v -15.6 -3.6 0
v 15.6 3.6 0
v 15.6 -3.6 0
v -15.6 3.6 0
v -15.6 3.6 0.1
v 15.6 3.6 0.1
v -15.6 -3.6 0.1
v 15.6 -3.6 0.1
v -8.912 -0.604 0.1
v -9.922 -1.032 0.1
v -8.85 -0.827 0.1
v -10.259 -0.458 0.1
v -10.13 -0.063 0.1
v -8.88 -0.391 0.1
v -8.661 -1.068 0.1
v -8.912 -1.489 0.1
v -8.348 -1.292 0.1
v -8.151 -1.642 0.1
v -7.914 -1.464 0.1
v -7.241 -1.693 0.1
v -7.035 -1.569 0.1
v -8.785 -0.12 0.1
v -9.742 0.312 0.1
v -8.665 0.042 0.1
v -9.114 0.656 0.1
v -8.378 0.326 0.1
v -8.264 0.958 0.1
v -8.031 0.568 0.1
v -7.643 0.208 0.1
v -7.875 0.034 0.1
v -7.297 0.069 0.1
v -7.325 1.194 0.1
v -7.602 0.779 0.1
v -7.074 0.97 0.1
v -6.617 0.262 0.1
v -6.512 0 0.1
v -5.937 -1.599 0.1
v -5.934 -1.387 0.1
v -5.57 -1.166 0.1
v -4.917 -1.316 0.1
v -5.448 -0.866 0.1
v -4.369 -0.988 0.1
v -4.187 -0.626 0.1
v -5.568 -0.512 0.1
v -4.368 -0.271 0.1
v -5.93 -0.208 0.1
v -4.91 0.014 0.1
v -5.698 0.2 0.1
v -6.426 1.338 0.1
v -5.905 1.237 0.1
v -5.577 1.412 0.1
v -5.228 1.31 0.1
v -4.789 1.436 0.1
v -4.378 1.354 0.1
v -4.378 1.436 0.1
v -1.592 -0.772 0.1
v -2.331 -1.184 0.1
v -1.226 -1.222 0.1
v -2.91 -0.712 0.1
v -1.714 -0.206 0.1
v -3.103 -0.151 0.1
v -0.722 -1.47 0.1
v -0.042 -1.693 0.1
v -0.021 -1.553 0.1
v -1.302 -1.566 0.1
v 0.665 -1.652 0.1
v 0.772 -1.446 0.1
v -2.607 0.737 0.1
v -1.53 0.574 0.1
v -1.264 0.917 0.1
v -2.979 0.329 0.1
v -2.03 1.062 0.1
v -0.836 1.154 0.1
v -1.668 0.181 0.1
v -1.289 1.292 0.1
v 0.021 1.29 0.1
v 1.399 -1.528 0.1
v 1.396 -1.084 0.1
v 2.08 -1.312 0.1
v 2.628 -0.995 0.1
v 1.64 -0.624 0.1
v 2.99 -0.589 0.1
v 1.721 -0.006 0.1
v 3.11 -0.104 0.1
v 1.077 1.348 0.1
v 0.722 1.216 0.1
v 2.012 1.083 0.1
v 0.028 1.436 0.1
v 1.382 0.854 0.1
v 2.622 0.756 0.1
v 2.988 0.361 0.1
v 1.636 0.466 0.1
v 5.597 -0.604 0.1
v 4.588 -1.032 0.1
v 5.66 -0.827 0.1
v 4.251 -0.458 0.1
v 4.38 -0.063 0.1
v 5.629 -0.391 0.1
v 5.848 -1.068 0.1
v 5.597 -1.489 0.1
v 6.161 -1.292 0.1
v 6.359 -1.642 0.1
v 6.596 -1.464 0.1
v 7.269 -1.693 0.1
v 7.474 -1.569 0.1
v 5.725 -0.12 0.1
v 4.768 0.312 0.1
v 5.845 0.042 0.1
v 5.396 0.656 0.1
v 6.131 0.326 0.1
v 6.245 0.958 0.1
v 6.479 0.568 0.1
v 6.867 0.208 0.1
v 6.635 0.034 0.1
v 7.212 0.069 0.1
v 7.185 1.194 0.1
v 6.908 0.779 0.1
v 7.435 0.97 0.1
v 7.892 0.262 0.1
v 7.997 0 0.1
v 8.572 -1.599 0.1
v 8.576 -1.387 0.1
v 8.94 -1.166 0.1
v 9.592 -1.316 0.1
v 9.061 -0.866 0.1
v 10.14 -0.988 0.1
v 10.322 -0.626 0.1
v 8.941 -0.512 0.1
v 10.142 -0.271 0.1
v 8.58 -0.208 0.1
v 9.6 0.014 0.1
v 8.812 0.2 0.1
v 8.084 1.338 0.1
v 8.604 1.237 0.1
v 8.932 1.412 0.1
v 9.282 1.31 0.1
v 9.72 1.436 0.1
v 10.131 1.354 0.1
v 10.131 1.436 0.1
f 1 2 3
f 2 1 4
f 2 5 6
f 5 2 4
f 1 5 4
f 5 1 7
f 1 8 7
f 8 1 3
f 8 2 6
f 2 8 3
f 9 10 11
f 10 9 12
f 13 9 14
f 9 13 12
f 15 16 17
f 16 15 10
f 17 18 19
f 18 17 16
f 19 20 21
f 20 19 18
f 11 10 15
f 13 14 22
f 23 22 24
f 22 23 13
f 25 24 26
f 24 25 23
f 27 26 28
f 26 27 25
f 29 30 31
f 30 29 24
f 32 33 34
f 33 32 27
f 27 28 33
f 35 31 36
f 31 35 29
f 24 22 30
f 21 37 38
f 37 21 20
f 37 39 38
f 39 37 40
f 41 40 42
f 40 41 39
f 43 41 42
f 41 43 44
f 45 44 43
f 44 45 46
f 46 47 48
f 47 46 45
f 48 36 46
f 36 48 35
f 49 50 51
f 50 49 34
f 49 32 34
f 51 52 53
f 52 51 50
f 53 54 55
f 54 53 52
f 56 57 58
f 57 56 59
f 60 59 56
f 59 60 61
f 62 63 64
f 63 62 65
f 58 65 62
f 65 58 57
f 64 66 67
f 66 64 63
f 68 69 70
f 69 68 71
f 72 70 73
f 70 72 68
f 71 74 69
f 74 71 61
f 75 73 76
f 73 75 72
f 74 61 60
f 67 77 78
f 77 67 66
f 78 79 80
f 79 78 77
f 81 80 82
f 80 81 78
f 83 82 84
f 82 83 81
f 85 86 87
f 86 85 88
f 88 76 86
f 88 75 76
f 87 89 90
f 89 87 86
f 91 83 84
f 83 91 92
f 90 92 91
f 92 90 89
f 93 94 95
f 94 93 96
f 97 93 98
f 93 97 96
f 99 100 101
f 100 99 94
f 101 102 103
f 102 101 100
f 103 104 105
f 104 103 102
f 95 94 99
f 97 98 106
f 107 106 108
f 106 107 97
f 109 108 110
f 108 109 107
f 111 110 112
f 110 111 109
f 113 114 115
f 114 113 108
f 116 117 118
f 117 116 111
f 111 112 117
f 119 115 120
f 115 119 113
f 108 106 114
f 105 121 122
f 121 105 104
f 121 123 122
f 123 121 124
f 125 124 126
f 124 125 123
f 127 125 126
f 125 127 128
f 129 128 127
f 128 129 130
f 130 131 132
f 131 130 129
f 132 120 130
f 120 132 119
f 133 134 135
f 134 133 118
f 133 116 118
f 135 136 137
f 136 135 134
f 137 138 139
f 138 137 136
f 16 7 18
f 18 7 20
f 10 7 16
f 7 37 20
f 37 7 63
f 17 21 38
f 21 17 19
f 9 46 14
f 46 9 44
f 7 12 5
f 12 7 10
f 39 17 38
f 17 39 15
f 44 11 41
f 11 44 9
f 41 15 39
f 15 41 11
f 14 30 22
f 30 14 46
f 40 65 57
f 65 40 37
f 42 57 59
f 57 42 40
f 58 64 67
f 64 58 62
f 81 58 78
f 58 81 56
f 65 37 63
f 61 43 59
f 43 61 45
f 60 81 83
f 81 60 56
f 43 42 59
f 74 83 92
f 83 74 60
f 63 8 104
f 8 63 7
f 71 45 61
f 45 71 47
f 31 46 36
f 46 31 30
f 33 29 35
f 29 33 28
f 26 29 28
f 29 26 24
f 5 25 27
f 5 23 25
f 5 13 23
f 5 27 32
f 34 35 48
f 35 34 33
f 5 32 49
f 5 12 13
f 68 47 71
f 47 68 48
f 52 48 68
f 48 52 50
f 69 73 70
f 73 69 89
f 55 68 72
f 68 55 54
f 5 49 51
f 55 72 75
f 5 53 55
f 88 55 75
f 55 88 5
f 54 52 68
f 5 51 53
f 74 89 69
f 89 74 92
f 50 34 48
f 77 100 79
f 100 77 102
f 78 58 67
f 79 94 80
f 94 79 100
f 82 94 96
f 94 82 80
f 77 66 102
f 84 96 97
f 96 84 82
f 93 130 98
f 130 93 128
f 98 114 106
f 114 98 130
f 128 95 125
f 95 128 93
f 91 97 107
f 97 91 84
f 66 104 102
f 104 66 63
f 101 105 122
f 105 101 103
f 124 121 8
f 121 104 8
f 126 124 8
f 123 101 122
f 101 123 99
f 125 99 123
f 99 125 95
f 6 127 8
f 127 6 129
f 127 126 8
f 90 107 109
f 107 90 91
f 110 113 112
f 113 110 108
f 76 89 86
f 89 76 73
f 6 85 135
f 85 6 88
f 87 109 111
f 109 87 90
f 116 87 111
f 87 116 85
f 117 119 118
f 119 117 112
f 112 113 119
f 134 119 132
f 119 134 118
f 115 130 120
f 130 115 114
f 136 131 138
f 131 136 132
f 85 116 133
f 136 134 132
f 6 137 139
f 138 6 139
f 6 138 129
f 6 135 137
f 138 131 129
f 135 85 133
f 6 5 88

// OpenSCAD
// file: ../p/box5-12.scad
use <../lib.scad>
function ldraw_lib__box5_12() = [
// 0 Box with 5 Faces without Any Edges
// 0 Name: box5-12.dat
// 0 Author: Chris Dee [cwdee]
// 0 !LDRAW_ORG Primitive UPDATE 2009-02
// 0 !LICENSE Licensed under CC BY 2.0 and CC BY 4.0 : see CAreadme.txt
// 
// 0 BFC CERTIFY CCW
  [0,"BFC","CERTIFY"],
  [0,"BFC","CCW"],
// 
// 0 !HISTORY 2009-09-03 [PTadmin] Official Update 2009-02
// 
// 
// 4 16 1 1 1 1 1 -1 -1 1 -1 -1 1 1
  [4,16,1,1,1,1,1,-1,-1,1,-1,-1,1,1],
// 4 16 -1 0 1 1 0 1 1 1 1 -1 1 1
  [4,16,-1,0,1,1,0,1,1,1,1,-1,1,1],
// 4 16 -1 0 -1 -1 0 1 -1 1 1 -1 1 -1
  [4,16,-1,0,-1,-1,0,1,-1,1,1,-1,1,-1],
// 4 16 1 0 -1 -1 0 -1 -1 1 -1 1 1 -1
  [4,16,1,0,-1,-1,0,-1,-1,1,-1,1,1,-1],
// 4 16 1 0 1 1 0 -1 1 1 -1 1 1 1
  [4,16,1,0,1,1,0,-1,1,1,-1,1,1,1],
// 0
];
makepoly(ldraw_lib__box5_12(), line=0.2);
// main file
use <../lib.scad>
use <../p/box5-12.scad>
function ldraw_lib__4188571f() = [
// 0 Sticker  0.9 x  3.9 with Black "606"
// 0 Name: 4188571f.dat
// 0 Author: Gerald Lasser [GeraldLasser]
// 0 !LDRAW_ORG Part UPDATE 2015-01
// 0 !LICENSE Licensed under CC BY 2.0 and CC BY 4.0 : see CAreadme.txt
// 
// 0 BFC CERTIFY CCW
  [0,"BFC","CERTIFY"],
  [0,"BFC","CCW"],
// 
// 0 !KEYWORDS santa fe, Train
// 
// 0 !HISTORY 2015-10-11 [PTadmin] Official Update 2015-01
// 
// 
// 0 // Original Text Produced by txt2dat, Copyright 2005-2007, 2009 R. Crawford
// 0 // Using font: "Times New Roman" style: "Regular" size: 40pt
// 0 // LDRAW Scaling of Txt2dat output: 1.02 0 0 0 1 0 0 0 0.32
// 
// 1 80 0 -0.25 0 39 0 0 0 0.25 0 0 0 9 box5-12.dat
  [1,80,0,-0.25,0,39,0,0,0,0.25,0,0,0,9, ldraw_lib__box5_12()],
// 
// 4 0 -24.805 -0.25 -2.58 -22.124 -0.25 -2.067 -22.281 -0.25 -1.511 -25.647 -0.25 -1.144
  [4,0,-24.805,-0.25,-2.58,-22.124,-0.25,-2.067,-22.281,-0.25,-1.511,-25.647,-0.25,-1.144],
// 4 0 -25.647 -0.25 -1.144 -22.281 -0.25 -1.511 -22.201 -0.25 -0.977 -25.324 -0.25 -0.158
  [4,0,-25.647,-0.25,-1.144,-22.281,-0.25,-1.511,-22.201,-0.25,-0.977,-25.324,-0.25,-0.158],
// 4 0 -21.653 -0.25 -2.669 -24.805 -0.25 -2.58 -22.281 -0.25 -3.722 -20.871 -0.25 -3.23
  [4,0,-21.653,-0.25,-2.669,-24.805,-0.25,-2.58,-22.281,-0.25,-3.722,-20.871,-0.25,-3.23],
// 4 0 -19.784 -0.25 -3.661 -20.871 -0.25 -3.23 -22.281 -0.25 -3.722 -20.378 -0.25 -4.105
  [4,0,-19.784,-0.25,-3.661,-20.871,-0.25,-3.23,-22.281,-0.25,-3.722,-20.378,-0.25,-4.105],
// 4 0 -19.784 -0.25 -3.661 -20.378 -0.25 -4.105 -18.102 -0.25 -4.233 -17.588 -0.25 -3.922
  [4,0,-19.784,-0.25,-3.661,-20.378,-0.25,-4.105,-18.102,-0.25,-4.233,-17.588,-0.25,-3.922],
// 3 0 -22.124 -0.25 -2.067 -24.805 -0.25 -2.58 -21.653 -0.25 -2.669
  [3,0,-22.124,-0.25,-2.067,-24.805,-0.25,-2.58,-21.653,-0.25,-2.669],
// 3 0 -25.324 -0.25 -0.158 -22.201 -0.25 -0.977 -21.963 -0.25 -0.299
  [3,0,-25.324,-0.25,-0.158,-22.201,-0.25,-0.977,-21.963,-0.25,-0.299],
// 4 0 -21.662 -0.25 0.106 -24.354 -0.25 0.779 -25.324 -0.25 -0.158 -21.963 -0.25 -0.299
  [4,0,-21.662,-0.25,0.106,-24.354,-0.25,0.779,-25.324,-0.25,-0.158,-21.963,-0.25,-0.299],
// 4 0 -24.354 -0.25 0.779 -21.662 -0.25 0.106 -20.946 -0.25 0.816 -22.784 -0.25 1.639
  [4,0,-24.354,-0.25,0.779,-21.662,-0.25,0.106,-20.946,-0.25,0.816,-22.784,-0.25,1.639],
// 4 0 -20.077 -0.25 1.421 -20.661 -0.25 2.396 -22.784 -0.25 1.639 -20.946 -0.25 0.816
  [4,0,-20.077,-0.25,1.421,-20.661,-0.25,2.396,-22.784,-0.25,1.639,-20.946,-0.25,0.816],
// 4 0 -19.107 -0.25 0.519 -21.662 -0.25 0.106 -19.687 -0.25 0.084 -18.243 -0.25 0.173
  [4,0,-19.107,-0.25,0.519,-21.662,-0.25,0.106,-19.687,-0.25,0.084,-18.243,-0.25,0.173],
// 4 0 -17.686 -0.25 2.424 -18.312 -0.25 2.986 -20.661 -0.25 2.396 -19.005 -0.25 1.948
  [4,0,-17.686,-0.25,2.424,-18.312,-0.25,2.986,-20.661,-0.25,2.396,-19.005,-0.25,1.948],
// 3 0 -20.661 -0.25 2.396 -20.077 -0.25 1.421 -19.005 -0.25 1.948
  [3,0,-20.661,-0.25,2.396,-20.077,-0.25,1.421,-19.005,-0.25,1.948],
// 4 0 -16.543 -0.25 0.656 -19.107 -0.25 0.519 -18.243 -0.25 0.173 -16.281 -0.25 0
  [4,0,-16.543,-0.25,0.656,-19.107,-0.25,0.519,-18.243,-0.25,0.173,-16.281,-0.25,0],
// 3 0 -21.662 -0.25 0.106 -21.963 -0.25 -0.299 -19.687 -0.25 0.084
  [3,0,-21.662,-0.25,0.106,-21.963,-0.25,-0.299,-19.687,-0.25,0.084],
// 4 0 -17.588 -0.25 -3.922 -18.102 -0.25 -4.233 -14.842 -0.25 -3.997 -14.834 -0.25 -3.467
  [4,0,-17.588,-0.25,-3.922,-18.102,-0.25,-4.233,-14.842,-0.25,-3.997,-14.834,-0.25,-3.467],
// 4 0 -12.292 -0.25 -3.289 -13.924 -0.25 -2.914 -14.834 -0.25 -3.467 -14.842 -0.25 -3.997
  [4,0,-12.292,-0.25,-3.289,-13.924,-0.25,-2.914,-14.834,-0.25,-3.467,-14.842,-0.25,-3.997],
// 4 0 -10.923 -0.25 -2.469 -13.62 -0.25 -2.166 -13.924 -0.25 -2.914 -12.292 -0.25 -3.289
  [4,0,-10.923,-0.25,-2.469,-13.62,-0.25,-2.166,-13.924,-0.25,-2.914,-12.292,-0.25,-3.289],
// 4 0 -13.62 -0.25 -2.166 -10.923 -0.25 -2.469 -10.467 -0.25 -1.566 -13.921 -0.25 -1.28
  [4,0,-13.62,-0.25,-2.166,-10.923,-0.25,-2.469,-10.467,-0.25,-1.566,-13.921,-0.25,-1.28],
// 4 0 -13.921 -0.25 -1.28 -10.467 -0.25 -1.566 -10.919 -0.25 -0.677 -14.825 -0.25 -0.521
  [4,0,-13.921,-0.25,-1.28,-10.467,-0.25,-1.566,-10.919,-0.25,-0.677,-14.825,-0.25,-0.521],
// 4 0 -14.825 -0.25 -0.521 -10.919 -0.25 -0.677 -12.275 -0.25 0.034 -14.245 -0.25 0.501
  [4,0,-14.825,-0.25,-0.521,-10.919,-0.25,-0.677,-12.275,-0.25,0.034,-14.245,-0.25,0.501],
// 4 0 -14.245 -0.25 0.501 -16.543 -0.25 0.656 -16.281 -0.25 0 -14.825 -0.25 -0.521
  [4,0,-14.245,-0.25,0.501,-16.543,-0.25,0.656,-16.281,-0.25,0,-14.825,-0.25,-0.521],
// 4 0 -16.065 -0.25 3.346 -17.686 -0.25 2.424 -14.762 -0.25 3.093 -13.943 -0.25 3.529
  [4,0,-16.065,-0.25,3.346,-17.686,-0.25,2.424,-14.762,-0.25,3.093,-13.943,-0.25,3.529],
// 3 0 -16.065 -0.25 3.346 -18.312 -0.25 2.986 -17.686 -0.25 2.424
  [3,0,-16.065,-0.25,3.346,-18.312,-0.25,2.986,-17.686,-0.25,2.424],
// 4 0 -13.943 -0.25 3.529 -14.762 -0.25 3.093 -13.069 -0.25 3.276 -11.973 -0.25 3.59
  [4,0,-13.943,-0.25,3.529,-14.762,-0.25,3.093,-13.069,-0.25,3.276,-11.973,-0.25,3.59],
// 4 0 -11.973 -0.25 3.59 -13.069 -0.25 3.276 -10.946 -0.25 3.385 -10.946 -0.25 3.59
  [4,0,-11.973,-0.25,3.59,-13.069,-0.25,3.276,-10.946,-0.25,3.385,-10.946,-0.25,3.59],
// 4 0 -3.981 -0.25 -1.929 -7.275 -0.25 -1.779 -5.827 -0.25 -2.961 -3.064 -0.25 -3.055
  [4,0,-3.981,-0.25,-1.929,-7.275,-0.25,-1.779,-5.827,-0.25,-2.961,-3.064,-0.25,-3.055],
// 4 0 -4.286 -0.25 -0.516 -7.758 -0.25 -0.377 -7.275 -0.25 -1.779 -3.981 -0.25 -1.929
  [4,0,-4.286,-0.25,-0.516,-7.758,-0.25,-0.377,-7.275,-0.25,-1.779,-3.981,-0.25,-1.929],
// 4 0 -1.806 -0.25 -3.676 -3.255 -0.25 -3.915 -0.106 -0.25 -4.233 -0.053 -0.25 -3.883
  [4,0,-1.806,-0.25,-3.676,-3.255,-0.25,-3.915,-0.106,-0.25,-4.233,-0.053,-0.25,-3.883],
// 4 0 -3.255 -0.25 -3.915 -1.806 -0.25 -3.676 -3.064 -0.25 -3.055 -5.827 -0.25 -2.961
  [4,0,-3.255,-0.25,-3.915,-1.806,-0.25,-3.676,-3.064,-0.25,-3.055,-5.827,-0.25,-2.961],
// 4 0 -0.053 -0.25 -3.883 -0.106 -0.25 -4.233 1.663 -0.25 -4.13 1.931 -0.25 -3.614
  [4,0,-0.053,-0.25,-3.883,-0.106,-0.25,-4.233,1.663,-0.25,-4.13,1.931,-0.25,-3.614],
// 4 0 -6.518 -0.25 1.843 -7.448 -0.25 0.823 -3.826 -0.25 1.434 -3.161 -0.25 2.292
  [4,0,-6.518,-0.25,1.843,-7.448,-0.25,0.823,-3.826,-0.25,1.434,-3.161,-0.25,2.292],
// 4 0 -5.074 -0.25 2.655 -6.518 -0.25 1.843 -3.161 -0.25 2.292 -2.09 -0.25 2.885
  [4,0,-5.074,-0.25,2.655,-6.518,-0.25,1.843,-3.161,-0.25,2.292,-2.09,-0.25,2.885],
// 4 0 -7.448 -0.25 0.823 -7.758 -0.25 -0.377 -4.171 -0.25 0.452 -3.826 -0.25 1.434
  [4,0,-7.448,-0.25,0.823,-7.758,-0.25,-0.377,-4.171,-0.25,0.452,-3.826,-0.25,1.434],
// 4 0 -3.223 -0.25 3.229 -5.074 -0.25 2.655 -2.09 -0.25 2.885 0.053 -0.25 3.224
  [4,0,-3.223,-0.25,3.229,-5.074,-0.25,2.655,-2.09,-0.25,2.885,0.053,-0.25,3.224],
// 3 0 -4.171 -0.25 0.452 -7.758 -0.25 -0.377 -4.286 -0.25 -0.516
  [3,0,-4.171,-0.25,0.452,-7.758,-0.25,-0.377,-4.286,-0.25,-0.516],
// 4 0 1.931 -0.25 -3.614 1.663 -0.25 -4.13 3.498 -0.25 -3.819 3.489 -0.25 -2.711
  [4,0,1.931,-0.25,-3.614,1.663,-0.25,-4.13,3.498,-0.25,-3.819,3.489,-0.25,-2.711],
// 4 0 3.489 -0.25 -2.711 3.498 -0.25 -3.819 5.201 -0.25 -3.28 6.571 -0.25 -2.488
  [4,0,3.489,-0.25,-2.711,3.498,-0.25,-3.819,5.201,-0.25,-3.28,6.571,-0.25,-2.488],
// 4 0 4.1 -0.25 -1.559 3.489 -0.25 -2.711 6.571 -0.25 -2.488 7.475 -0.25 -1.473
  [4,0,4.1,-0.25,-1.559,3.489,-0.25,-2.711,6.571,-0.25,-2.488,7.475,-0.25,-1.473],
// 4 0 4.1 -0.25 -1.559 7.475 -0.25 -1.473 7.775 -0.25 -0.26 4.303 -0.25 -0.016
  [4,0,4.1,-0.25,-1.559,7.475,-0.25,-1.473,7.775,-0.25,-0.26,4.303,-0.25,-0.016],
// 4 0 1.806 -0.25 3.04 5.031 -0.25 2.707 2.692 -0.25 3.369 0.071 -0.25 3.59
  [4,0,1.806,-0.25,3.04,5.031,-0.25,2.707,2.692,-0.25,3.369,0.071,-0.25,3.59],
// 3 0 0.071 -0.25 3.59 0.053 -0.25 3.224 1.806 -0.25 3.04
  [3,0,0.071,-0.25,3.59,0.053,-0.25,3.224,1.806,-0.25,3.04],
// 3 0 0.071 -0.25 3.59 -3.223 -0.25 3.229 0.053 -0.25 3.224
  [3,0,0.071,-0.25,3.59,-3.223,-0.25,3.229,0.053,-0.25,3.224],
// 4 0 5.031 -0.25 2.707 1.806 -0.25 3.04 3.454 -0.25 2.135 6.556 -0.25 1.891
  [4,0,5.031,-0.25,2.707,1.806,-0.25,3.04,3.454,-0.25,2.135,6.556,-0.25,1.891],
// 4 0 7.47 -0.25 0.902 4.091 -0.25 1.166 4.303 -0.25 -0.016 7.775 -0.25 -0.26
  [4,0,7.47,-0.25,0.902,4.091,-0.25,1.166,4.303,-0.25,-0.016,7.775,-0.25,-0.26],
// 4 0 4.091 -0.25 1.166 7.47 -0.25 0.902 6.556 -0.25 1.891 3.454 -0.25 2.135
  [4,0,4.091,-0.25,1.166,7.47,-0.25,0.902,6.556,-0.25,1.891,3.454,-0.25,2.135],
// 4 0 11.469 -0.25 -2.58 14.149 -0.25 -2.067 13.992 -0.25 -1.511 10.627 -0.25 -1.144
  [4,0,11.469,-0.25,-2.58,14.149,-0.25,-2.067,13.992,-0.25,-1.511,10.627,-0.25,-1.144],
// 4 0 10.627 -0.25 -1.144 13.992 -0.25 -1.511 14.072 -0.25 -0.977 10.951 -0.25 -0.158
  [4,0,10.627,-0.25,-1.144,13.992,-0.25,-1.511,14.072,-0.25,-0.977,10.951,-0.25,-0.158],
// 4 0 14.621 -0.25 -2.669 11.469 -0.25 -2.58 13.992 -0.25 -3.722 15.403 -0.25 -3.23
  [4,0,14.621,-0.25,-2.669,11.469,-0.25,-2.58,13.992,-0.25,-3.722,15.403,-0.25,-3.23],
// 4 0 16.489 -0.25 -3.661 15.403 -0.25 -3.23 13.992 -0.25 -3.722 15.897 -0.25 -4.105
  [4,0,16.489,-0.25,-3.661,15.403,-0.25,-3.23,13.992,-0.25,-3.722,15.897,-0.25,-4.105],
// 4 0 16.489 -0.25 -3.661 15.897 -0.25 -4.105 18.172 -0.25 -4.233 18.686 -0.25 -3.922
  [4,0,16.489,-0.25,-3.661,15.897,-0.25,-4.105,18.172,-0.25,-4.233,18.686,-0.25,-3.922],
// 3 0 14.149 -0.25 -2.067 11.469 -0.25 -2.58 14.621 -0.25 -2.669
  [3,0,14.149,-0.25,-2.067,11.469,-0.25,-2.58,14.621,-0.25,-2.669],
// 3 0 10.951 -0.25 -0.158 14.072 -0.25 -0.977 14.312 -0.25 -0.299
  [3,0,10.951,-0.25,-0.158,14.072,-0.25,-0.977,14.312,-0.25,-0.299],
// 4 0 14.613 -0.25 0.106 11.92 -0.25 0.779 10.951 -0.25 -0.158 14.312 -0.25 -0.299
  [4,0,14.613,-0.25,0.106,11.92,-0.25,0.779,10.951,-0.25,-0.158,14.312,-0.25,-0.299],
// 4 0 11.92 -0.25 0.779 14.613 -0.25 0.106 15.328 -0.25 0.816 13.489 -0.25 1.639
  [4,0,11.92,-0.25,0.779,14.613,-0.25,0.106,15.328,-0.25,0.816,13.489,-0.25,1.639],
// 4 0 16.198 -0.25 1.421 15.613 -0.25 2.396 13.489 -0.25 1.639 15.328 -0.25 0.816
  [4,0,16.198,-0.25,1.421,15.613,-0.25,2.396,13.489,-0.25,1.639,15.328,-0.25,0.816],
// 4 0 17.167 -0.25 0.519 14.613 -0.25 0.106 16.587 -0.25 0.084 18.031 -0.25 0.173
  [4,0,17.167,-0.25,0.519,14.613,-0.25,0.106,16.587,-0.25,0.084,18.031,-0.25,0.173],
// 4 0 18.588 -0.25 2.424 17.962 -0.25 2.986 15.613 -0.25 2.396 17.269 -0.25 1.948
  [4,0,18.588,-0.25,2.424,17.962,-0.25,2.986,15.613,-0.25,2.396,17.269,-0.25,1.948],
// 3 0 15.613 -0.25 2.396 16.198 -0.25 1.421 17.269 -0.25 1.948
  [3,0,15.613,-0.25,2.396,16.198,-0.25,1.421,17.269,-0.25,1.948],
// 4 0 19.731 -0.25 0.656 17.167 -0.25 0.519 18.031 -0.25 0.173 19.992 -0.25 0
  [4,0,19.731,-0.25,0.656,17.167,-0.25,0.519,18.031,-0.25,0.173,19.992,-0.25,0],
// 3 0 14.613 -0.25 0.106 14.312 -0.25 -0.299 16.587 -0.25 0.084
  [3,0,14.613,-0.25,0.106,14.312,-0.25,-0.299,16.587,-0.25,0.084],
// 4 0 18.686 -0.25 -3.922 18.172 -0.25 -4.233 21.431 -0.25 -3.997 21.44 -0.25 -3.467
  [4,0,18.686,-0.25,-3.922,18.172,-0.25,-4.233,21.431,-0.25,-3.997,21.44,-0.25,-3.467],
// 4 0 23.981 -0.25 -3.289 22.35 -0.25 -2.914 21.44 -0.25 -3.467 21.431 -0.25 -3.997
  [4,0,23.981,-0.25,-3.289,22.35,-0.25,-2.914,21.44,-0.25,-3.467,21.431,-0.25,-3.997],
// 4 0 25.35 -0.25 -2.469 22.653 -0.25 -2.166 22.35 -0.25 -2.914 23.981 -0.25 -3.289
  [4,0,25.35,-0.25,-2.469,22.653,-0.25,-2.166,22.35,-0.25,-2.914,23.981,-0.25,-3.289],
// 4 0 22.653 -0.25 -2.166 25.35 -0.25 -2.469 25.806 -0.25 -1.566 22.352 -0.25 -1.28
  [4,0,22.653,-0.25,-2.166,25.35,-0.25,-2.469,25.806,-0.25,-1.566,22.352,-0.25,-1.28],
// 4 0 22.352 -0.25 -1.28 25.806 -0.25 -1.566 25.354 -0.25 -0.677 21.449 -0.25 -0.521
  [4,0,22.352,-0.25,-1.28,25.806,-0.25,-1.566,25.354,-0.25,-0.677,21.449,-0.25,-0.521],
// 4 0 21.449 -0.25 -0.521 25.354 -0.25 -0.677 24 -0.25 0.034 22.029 -0.25 0.501
  [4,0,21.449,-0.25,-0.521,25.354,-0.25,-0.677,24,-0.25,0.034,22.029,-0.25,0.501],
// 4 0 22.029 -0.25 0.501 19.731 -0.25 0.656 19.992 -0.25 0 21.449 -0.25 -0.521
  [4,0,22.029,-0.25,0.501,19.731,-0.25,0.656,19.992,-0.25,0,21.449,-0.25,-0.521],
// 4 0 20.209 -0.25 3.346 18.588 -0.25 2.424 21.511 -0.25 3.093 22.33 -0.25 3.529
  [4,0,20.209,-0.25,3.346,18.588,-0.25,2.424,21.511,-0.25,3.093,22.33,-0.25,3.529],
// 3 0 20.209 -0.25 3.346 17.962 -0.25 2.986 18.588 -0.25 2.424
  [3,0,20.209,-0.25,3.346,17.962,-0.25,2.986,18.588,-0.25,2.424],
// 4 0 22.33 -0.25 3.529 21.511 -0.25 3.093 23.205 -0.25 3.276 24.3 -0.25 3.59
  [4,0,22.33,-0.25,3.529,21.511,-0.25,3.093,23.205,-0.25,3.276,24.3,-0.25,3.59],
// 4 0 24.3 -0.25 3.59 23.205 -0.25 3.276 25.328 -0.25 3.385 25.328 -0.25 3.59
  [4,0,24.3,-0.25,3.59,23.205,-0.25,3.276,25.328,-0.25,3.385,25.328,-0.25,3.59],
// 3 80 -22.281 -0.25 -3.722 -39 -0.25 -9 -20.378 -0.25 -4.105
  [3,80,-22.281,-0.25,-3.722,-39,-0.25,-9,-20.378,-0.25,-4.105],
// 3 80 -20.378 -0.25 -4.105 -39 -0.25 -9 -18.102 -0.25 -4.233
  [3,80,-20.378,-0.25,-4.105,-39,-0.25,-9,-18.102,-0.25,-4.233],
// 3 80 -24.805 -0.25 -2.58 -39 -0.25 -9 -22.281 -0.25 -3.722
  [3,80,-24.805,-0.25,-2.58,-39,-0.25,-9,-22.281,-0.25,-3.722],
// 4 80 -0.106 -0.25 -4.233 -14.842 -0.25 -3.997 -18.102 -0.25 -4.233 -39 -0.25 -9
  [4,80,-0.106,-0.25,-4.233,-14.842,-0.25,-3.997,-18.102,-0.25,-4.233,-39,-0.25,-9],
// 4 80 -19.784 -0.25 -3.661 -17.588 -0.25 -3.922 -14.834 -0.25 -3.467 -20.871 -0.25 -3.23
  [4,80,-19.784,-0.25,-3.661,-17.588,-0.25,-3.922,-14.834,-0.25,-3.467,-20.871,-0.25,-3.23],
// 4 80 -14.825 -0.25 -0.521 -22.201 -0.25 -0.977 -22.281 -0.25 -1.511 -13.921 -0.25 -1.28
  [4,80,-14.825,-0.25,-0.521,-22.201,-0.25,-0.977,-22.281,-0.25,-1.511,-13.921,-0.25,-1.28],
// 4 80 -39 -0.25 -9 -24.805 -0.25 -2.58 -25.647 -0.25 -1.144 -39 -0.25 9
  [4,80,-39,-0.25,-9,-24.805,-0.25,-2.58,-25.647,-0.25,-1.144,-39,-0.25,9],
// 4 80 -13.924 -0.25 -2.914 -21.653 -0.25 -2.669 -20.871 -0.25 -3.23 -14.834 -0.25 -3.467
  [4,80,-13.924,-0.25,-2.914,-21.653,-0.25,-2.669,-20.871,-0.25,-3.23,-14.834,-0.25,-3.467],
// 4 80 -13.921 -0.25 -1.28 -22.281 -0.25 -1.511 -22.124 -0.25 -2.067 -13.62 -0.25 -2.166
  [4,80,-13.921,-0.25,-1.28,-22.281,-0.25,-1.511,-22.124,-0.25,-2.067,-13.62,-0.25,-2.166],
// 4 80 -13.62 -0.25 -2.166 -22.124 -0.25 -2.067 -21.653 -0.25 -2.669 -13.924 -0.25 -2.914
  [4,80,-13.62,-0.25,-2.166,-22.124,-0.25,-2.067,-21.653,-0.25,-2.669,-13.924,-0.25,-2.914],
// 4 80 -22.201 -0.25 -0.977 -14.825 -0.25 -0.521 -19.687 -0.25 0.084 -21.963 -0.25 -0.299
  [4,80,-22.201,-0.25,-0.977,-14.825,-0.25,-0.521,-19.687,-0.25,0.084,-21.963,-0.25,-0.299],
// 4 80 -3.255 -0.25 -3.915 -5.827 -0.25 -2.961 -12.292 -0.25 -3.289 -14.842 -0.25 -3.997
  [4,80,-3.255,-0.25,-3.915,-5.827,-0.25,-2.961,-12.292,-0.25,-3.289,-14.842,-0.25,-3.997],
// 4 80 -10.923 -0.25 -2.469 -12.292 -0.25 -3.289 -5.827 -0.25 -2.961 -7.275 -0.25 -1.779
  [4,80,-10.923,-0.25,-2.469,-12.292,-0.25,-3.289,-5.827,-0.25,-2.961,-7.275,-0.25,-1.779],
// 4 80 1.931 -0.25 -3.614 -3.064 -0.25 -3.055 -1.806 -0.25 -3.676 -0.053 -0.25 -3.883
  [4,80,1.931,-0.25,-3.614,-3.064,-0.25,-3.055,-1.806,-0.25,-3.676,-0.053,-0.25,-3.883],
// 4 80 -3.981 -0.25 -1.929 -3.064 -0.25 -3.055 3.489 -0.25 -2.711 4.1 -0.25 -1.559
  [4,80,-3.981,-0.25,-1.929,-3.064,-0.25,-3.055,3.489,-0.25,-2.711,4.1,-0.25,-1.559],
// 3 80 -3.255 -0.25 -3.915 -14.842 -0.25 -3.997 -0.106 -0.25 -4.233
  [3,80,-3.255,-0.25,-3.915,-14.842,-0.25,-3.997,-0.106,-0.25,-4.233],
// 4 80 -10.467 -0.25 -1.566 -7.275 -0.25 -1.779 -7.758 -0.25 -0.377 -10.919 -0.25 -0.677
  [4,80,-10.467,-0.25,-1.566,-7.275,-0.25,-1.779,-7.758,-0.25,-0.377,-10.919,-0.25,-0.677],
// 4 80 -4.286 -0.25 -0.516 -3.981 -0.25 -1.929 4.1 -0.25 -1.559 4.303 -0.25 -0.016
  [4,80,-4.286,-0.25,-0.516,-3.981,-0.25,-1.929,4.1,-0.25,-1.559,4.303,-0.25,-0.016],
// 3 80 -10.467 -0.25 -1.566 -10.923 -0.25 -2.469 -7.275 -0.25 -1.779
  [3,80,-10.467,-0.25,-1.566,-10.923,-0.25,-2.469,-7.275,-0.25,-1.779],
// 4 80 -4.171 -0.25 0.452 -4.286 -0.25 -0.516 4.303 -0.25 -0.016 4.091 -0.25 1.166
  [4,80,-4.171,-0.25,0.452,-4.286,-0.25,-0.516,4.303,-0.25,-0.016,4.091,-0.25,1.166],
// 4 80 -0.106 -0.25 -4.233 -39 -0.25 -9 39 -0.25 -9 18.172 -0.25 -4.233
  [4,80,-0.106,-0.25,-4.233,-39,-0.25,-9,39,-0.25,-9,18.172,-0.25,-4.233],
// 4 80 -12.275 -0.25 0.034 -10.919 -0.25 -0.677 -7.758 -0.25 -0.377 -7.448 -0.25 0.823
  [4,80,-12.275,-0.25,0.034,-10.919,-0.25,-0.677,-7.758,-0.25,-0.377,-7.448,-0.25,0.823],
// 4 80 -18.243 -0.25 0.173 -19.687 -0.25 0.084 -14.825 -0.25 -0.521 -16.281 -0.25 0
  [4,80,-18.243,-0.25,0.173,-19.687,-0.25,0.084,-14.825,-0.25,-0.521,-16.281,-0.25,0],
// 4 80 -20.077 -0.25 1.421 -19.107 -0.25 0.519 -16.543 -0.25 0.656 -19.005 -0.25 1.948
  [4,80,-20.077,-0.25,1.421,-19.107,-0.25,0.519,-16.543,-0.25,0.656,-19.005,-0.25,1.948],
// 4 80 -20.946 -0.25 0.816 -21.662 -0.25 0.106 -19.107 -0.25 0.519 -20.077 -0.25 1.421
  [4,80,-20.946,-0.25,0.816,-21.662,-0.25,0.106,-19.107,-0.25,0.519,-20.077,-0.25,1.421],
// 3 80 -39 -0.25 9 -22.784 -0.25 1.639 -20.661 -0.25 2.396
  [3,80,-39,-0.25,9,-22.784,-0.25,1.639,-20.661,-0.25,2.396],
// 3 80 -39 -0.25 9 -24.354 -0.25 0.779 -22.784 -0.25 1.639
  [3,80,-39,-0.25,9,-24.354,-0.25,0.779,-22.784,-0.25,1.639],
// 3 80 -39 -0.25 9 -25.324 -0.25 -0.158 -24.354 -0.25 0.779
  [3,80,-39,-0.25,9,-25.324,-0.25,-0.158,-24.354,-0.25,0.779],
// 3 80 -39 -0.25 9 -20.661 -0.25 2.396 -18.312 -0.25 2.986
  [3,80,-39,-0.25,9,-20.661,-0.25,2.396,-18.312,-0.25,2.986],
// 4 80 -17.686 -0.25 2.424 -19.005 -0.25 1.948 -16.543 -0.25 0.656 -14.245 -0.25 0.501
  [4,80,-17.686,-0.25,2.424,-19.005,-0.25,1.948,-16.543,-0.25,0.656,-14.245,-0.25,0.501],
// 3 80 -39 -0.25 9 -18.312 -0.25 2.986 -16.065 -0.25 3.346
  [3,80,-39,-0.25,9,-18.312,-0.25,2.986,-16.065,-0.25,3.346],
// 3 80 -39 -0.25 9 -25.647 -0.25 -1.144 -25.324 -0.25 -0.158
  [3,80,-39,-0.25,9,-25.647,-0.25,-1.144,-25.324,-0.25,-0.158],
// 4 80 -14.245 -0.25 0.501 -12.275 -0.25 0.034 -7.448 -0.25 0.823 -6.518 -0.25 1.843
  [4,80,-14.245,-0.25,0.501,-12.275,-0.25,0.034,-7.448,-0.25,0.823,-6.518,-0.25,1.843],
// 4 80 -14.245 -0.25 0.501 -6.518 -0.25 1.843 -13.069 -0.25 3.276 -14.762 -0.25 3.093
  [4,80,-14.245,-0.25,0.501,-6.518,-0.25,1.843,-13.069,-0.25,3.276,-14.762,-0.25,3.093],
// 4 80 3.454 -0.25 2.135 -2.09 -0.25 2.885 -3.161 -0.25 2.292 -3.826 -0.25 1.434
  [4,80,3.454,-0.25,2.135,-2.09,-0.25,2.885,-3.161,-0.25,2.292,-3.826,-0.25,1.434],
// 4 80 -10.946 -0.25 3.385 -6.518 -0.25 1.843 -5.074 -0.25 2.655 -10.946 -0.25 3.59
  [4,80,-10.946,-0.25,3.385,-6.518,-0.25,1.843,-5.074,-0.25,2.655,-10.946,-0.25,3.59],
// 3 80 -39 -0.25 9 -16.065 -0.25 3.346 -13.943 -0.25 3.529
  [3,80,-39,-0.25,9,-16.065,-0.25,3.346,-13.943,-0.25,3.529],
// 3 80 -10.946 -0.25 3.59 -5.074 -0.25 2.655 -3.223 -0.25 3.229
  [3,80,-10.946,-0.25,3.59,-5.074,-0.25,2.655,-3.223,-0.25,3.229],
// 3 80 -39 -0.25 9 -11.973 -0.25 3.59 -10.946 -0.25 3.59
  [3,80,-39,-0.25,9,-11.973,-0.25,3.59,-10.946,-0.25,3.59],
// 4 80 0.071 -0.25 3.59 -39 -0.25 9 -10.946 -0.25 3.59 -3.223 -0.25 3.229
  [4,80,0.071,-0.25,3.59,-39,-0.25,9,-10.946,-0.25,3.59,-3.223,-0.25,3.229],
// 3 80 -10.946 -0.25 3.385 -13.069 -0.25 3.276 -6.518 -0.25 1.843
  [3,80,-10.946,-0.25,3.385,-13.069,-0.25,3.276,-6.518,-0.25,1.843],
// 3 80 -39 -0.25 9 -13.943 -0.25 3.529 -11.973 -0.25 3.59
  [3,80,-39,-0.25,9,-13.943,-0.25,3.529,-11.973,-0.25,3.59],
// 4 80 -3.826 -0.25 1.434 -4.171 -0.25 0.452 4.091 -0.25 1.166 3.454 -0.25 2.135
  [4,80,-3.826,-0.25,1.434,-4.171,-0.25,0.452,4.091,-0.25,1.166,3.454,-0.25,2.135],
// 3 80 -14.762 -0.25 3.093 -17.686 -0.25 2.424 -14.245 -0.25 0.501
  [3,80,-14.762,-0.25,3.093,-17.686,-0.25,2.424,-14.245,-0.25,0.501],
// 4 80 3.498 -0.25 -3.819 15.897 -0.25 -4.105 13.992 -0.25 -3.722 5.201 -0.25 -3.28
  [4,80,3.498,-0.25,-3.819,15.897,-0.25,-4.105,13.992,-0.25,-3.722,5.201,-0.25,-3.28],
// 3 80 3.489 -0.25 -2.711 -3.064 -0.25 -3.055 1.931 -0.25 -3.614
  [3,80,3.489,-0.25,-2.711,-3.064,-0.25,-3.055,1.931,-0.25,-3.614],
// 4 80 5.201 -0.25 -3.28 13.992 -0.25 -3.722 11.469 -0.25 -2.58 6.571 -0.25 -2.488
  [4,80,5.201,-0.25,-3.28,13.992,-0.25,-3.722,11.469,-0.25,-2.58,6.571,-0.25,-2.488],
// 4 80 7.475 -0.25 -1.473 6.571 -0.25 -2.488 11.469 -0.25 -2.58 10.627 -0.25 -1.144
  [4,80,7.475,-0.25,-1.473,6.571,-0.25,-2.488,11.469,-0.25,-2.58,10.627,-0.25,-1.144],
// 3 80 3.498 -0.25 -3.819 1.663 -0.25 -4.13 15.897 -0.25 -4.105
  [3,80,3.498,-0.25,-3.819,1.663,-0.25,-4.13,15.897,-0.25,-4.105],
// 4 80 10.627 -0.25 -1.144 10.951 -0.25 -0.158 7.775 -0.25 -0.26 7.475 -0.25 -1.473
  [4,80,10.627,-0.25,-1.144,10.951,-0.25,-0.158,7.775,-0.25,-0.26,7.475,-0.25,-1.473],
// 4 80 21.449 -0.25 -0.521 14.072 -0.25 -0.977 13.992 -0.25 -1.511 22.352 -0.25 -1.28
  [4,80,21.449,-0.25,-0.521,14.072,-0.25,-0.977,13.992,-0.25,-1.511,22.352,-0.25,-1.28],
// 4 80 16.587 -0.25 0.084 14.312 -0.25 -0.299 14.072 -0.25 -0.977 21.449 -0.25 -0.521
  [4,80,16.587,-0.25,0.084,14.312,-0.25,-0.299,14.072,-0.25,-0.977,21.449,-0.25,-0.521],
// 4 80 22.352 -0.25 -1.28 13.992 -0.25 -1.511 14.149 -0.25 -2.067 22.653 -0.25 -2.166
  [4,80,22.352,-0.25,-1.28,13.992,-0.25,-1.511,14.149,-0.25,-2.067,22.653,-0.25,-2.166],
// 4 80 7.47 -0.25 0.902 7.775 -0.25 -0.26 10.951 -0.25 -0.158 11.92 -0.25 0.779
  [4,80,7.47,-0.25,0.902,7.775,-0.25,-0.26,10.951,-0.25,-0.158,11.92,-0.25,0.779],
// 4 80 15.897 -0.25 -4.105 1.663 -0.25 -4.13 -0.106 -0.25 -4.233 18.172 -0.25 -4.233
  [4,80,15.897,-0.25,-4.105,1.663,-0.25,-4.13,-0.106,-0.25,-4.233,18.172,-0.25,-4.233],
// 4 80 16.489 -0.25 -3.661 18.686 -0.25 -3.922 21.44 -0.25 -3.467 15.403 -0.25 -3.23
  [4,80,16.489,-0.25,-3.661,18.686,-0.25,-3.922,21.44,-0.25,-3.467,15.403,-0.25,-3.23],
// 3 80 23.981 -0.25 -3.289 21.431 -0.25 -3.997 39 -0.25 -9
  [3,80,23.981,-0.25,-3.289,21.431,-0.25,-3.997,39,-0.25,-9],
// 3 80 21.431 -0.25 -3.997 18.172 -0.25 -4.233 39 -0.25 -9
  [3,80,21.431,-0.25,-3.997,18.172,-0.25,-4.233,39,-0.25,-9],
// 3 80 25.35 -0.25 -2.469 23.981 -0.25 -3.289 39 -0.25 -9
  [3,80,25.35,-0.25,-2.469,23.981,-0.25,-3.289,39,-0.25,-9],
// 4 80 22.35 -0.25 -2.914 14.621 -0.25 -2.669 15.403 -0.25 -3.23 21.44 -0.25 -3.467
  [4,80,22.35,-0.25,-2.914,14.621,-0.25,-2.669,15.403,-0.25,-3.23,21.44,-0.25,-3.467],
// 4 80 22.653 -0.25 -2.166 14.149 -0.25 -2.067 14.621 -0.25 -2.669 22.35 -0.25 -2.914
  [4,80,22.653,-0.25,-2.166,14.149,-0.25,-2.067,14.621,-0.25,-2.669,22.35,-0.25,-2.914],
// 4 80 39 -0.25 9 25.354 -0.25 -0.677 25.806 -0.25 -1.566 39 -0.25 -9
  [4,80,39,-0.25,9,25.354,-0.25,-0.677,25.806,-0.25,-1.566,39,-0.25,-9],
// 3 80 25.806 -0.25 -1.566 25.35 -0.25 -2.469 39 -0.25 -9
  [3,80,25.806,-0.25,-1.566,25.35,-0.25,-2.469,39,-0.25,-9],
// 4 80 6.556 -0.25 1.891 7.47 -0.25 0.902 11.92 -0.25 0.779 13.489 -0.25 1.639
  [4,80,6.556,-0.25,1.891,7.47,-0.25,0.902,11.92,-0.25,0.779,13.489,-0.25,1.639],
// 4 80 17.167 -0.25 0.519 16.198 -0.25 1.421 15.328 -0.25 0.816 14.613 -0.25 0.106
  [4,80,17.167,-0.25,0.519,16.198,-0.25,1.421,15.328,-0.25,0.816,14.613,-0.25,0.106],
// 4 80 1.806 -0.25 3.04 0.053 -0.25 3.224 -2.09 -0.25 2.885 3.454 -0.25 2.135
  [4,80,1.806,-0.25,3.04,0.053,-0.25,3.224,-2.09,-0.25,2.885,3.454,-0.25,2.135],
// 4 80 0.071 -0.25 3.59 2.692 -0.25 3.369 22.33 -0.25 3.529 39 -0.25 9
  [4,80,0.071,-0.25,3.59,2.692,-0.25,3.369,22.33,-0.25,3.529,39,-0.25,9],
// 4 80 6.556 -0.25 1.891 13.489 -0.25 1.639 15.613 -0.25 2.396 5.031 -0.25 2.707
  [4,80,6.556,-0.25,1.891,13.489,-0.25,1.639,15.613,-0.25,2.396,5.031,-0.25,2.707],
// 4 80 17.962 -0.25 2.986 2.692 -0.25 3.369 5.031 -0.25 2.707 15.613 -0.25 2.396
  [4,80,17.962,-0.25,2.986,2.692,-0.25,3.369,5.031,-0.25,2.707,15.613,-0.25,2.396],
// 4 80 17.269 -0.25 1.948 16.198 -0.25 1.421 19.731 -0.25 0.656 18.588 -0.25 2.424
  [4,80,17.269,-0.25,1.948,16.198,-0.25,1.421,19.731,-0.25,0.656,18.588,-0.25,2.424],
// 3 80 16.198 -0.25 1.421 17.167 -0.25 0.519 19.731 -0.25 0.656
  [3,80,16.198,-0.25,1.421,17.167,-0.25,0.519,19.731,-0.25,0.656],
// 4 80 18.588 -0.25 2.424 19.731 -0.25 0.656 22.029 -0.25 0.501 21.511 -0.25 3.093
  [4,80,18.588,-0.25,2.424,19.731,-0.25,0.656,22.029,-0.25,0.501,21.511,-0.25,3.093],
// 4 80 18.031 -0.25 0.173 16.587 -0.25 0.084 21.449 -0.25 -0.521 19.992 -0.25 0
  [4,80,18.031,-0.25,0.173,16.587,-0.25,0.084,21.449,-0.25,-0.521,19.992,-0.25,0],
// 4 80 22.029 -0.25 0.501 24 -0.25 0.034 25.328 -0.25 3.385 23.205 -0.25 3.276
  [4,80,22.029,-0.25,0.501,24,-0.25,0.034,25.328,-0.25,3.385,23.205,-0.25,3.276],
// 3 80 2.692 -0.25 3.369 17.962 -0.25 2.986 20.209 -0.25 3.346
  [3,80,2.692,-0.25,3.369,17.962,-0.25,2.986,20.209,-0.25,3.346],
// 3 80 23.205 -0.25 3.276 21.511 -0.25 3.093 22.029 -0.25 0.501
  [3,80,23.205,-0.25,3.276,21.511,-0.25,3.093,22.029,-0.25,0.501],
// 3 80 39 -0.25 9 24.3 -0.25 3.59 25.328 -0.25 3.59
  [3,80,39,-0.25,9,24.3,-0.25,3.59,25.328,-0.25,3.59],
// 4 80 39 -0.25 9 25.328 -0.25 3.59 25.328 -0.25 3.385 25.354 -0.25 -0.677
  [4,80,39,-0.25,9,25.328,-0.25,3.59,25.328,-0.25,3.385,25.354,-0.25,-0.677],
// 3 80 39 -0.25 9 22.33 -0.25 3.529 24.3 -0.25 3.59
  [3,80,39,-0.25,9,22.33,-0.25,3.529,24.3,-0.25,3.59],
// 3 80 25.328 -0.25 3.385 24 -0.25 0.034 25.354 -0.25 -0.677
  [3,80,25.328,-0.25,3.385,24,-0.25,0.034,25.354,-0.25,-0.677],
// 3 80 22.33 -0.25 3.529 2.692 -0.25 3.369 20.209 -0.25 3.346
  [3,80,22.33,-0.25,3.529,2.692,-0.25,3.369,20.209,-0.25,3.346],
// 3 80 39 -0.25 9 -39 -0.25 9 0.071 -0.25 3.59
  [3,80,39,-0.25,9,-39,-0.25,9,0.071,-0.25,3.59],
];
makepoly(ldraw_lib__4188571f(), line=0.2);
